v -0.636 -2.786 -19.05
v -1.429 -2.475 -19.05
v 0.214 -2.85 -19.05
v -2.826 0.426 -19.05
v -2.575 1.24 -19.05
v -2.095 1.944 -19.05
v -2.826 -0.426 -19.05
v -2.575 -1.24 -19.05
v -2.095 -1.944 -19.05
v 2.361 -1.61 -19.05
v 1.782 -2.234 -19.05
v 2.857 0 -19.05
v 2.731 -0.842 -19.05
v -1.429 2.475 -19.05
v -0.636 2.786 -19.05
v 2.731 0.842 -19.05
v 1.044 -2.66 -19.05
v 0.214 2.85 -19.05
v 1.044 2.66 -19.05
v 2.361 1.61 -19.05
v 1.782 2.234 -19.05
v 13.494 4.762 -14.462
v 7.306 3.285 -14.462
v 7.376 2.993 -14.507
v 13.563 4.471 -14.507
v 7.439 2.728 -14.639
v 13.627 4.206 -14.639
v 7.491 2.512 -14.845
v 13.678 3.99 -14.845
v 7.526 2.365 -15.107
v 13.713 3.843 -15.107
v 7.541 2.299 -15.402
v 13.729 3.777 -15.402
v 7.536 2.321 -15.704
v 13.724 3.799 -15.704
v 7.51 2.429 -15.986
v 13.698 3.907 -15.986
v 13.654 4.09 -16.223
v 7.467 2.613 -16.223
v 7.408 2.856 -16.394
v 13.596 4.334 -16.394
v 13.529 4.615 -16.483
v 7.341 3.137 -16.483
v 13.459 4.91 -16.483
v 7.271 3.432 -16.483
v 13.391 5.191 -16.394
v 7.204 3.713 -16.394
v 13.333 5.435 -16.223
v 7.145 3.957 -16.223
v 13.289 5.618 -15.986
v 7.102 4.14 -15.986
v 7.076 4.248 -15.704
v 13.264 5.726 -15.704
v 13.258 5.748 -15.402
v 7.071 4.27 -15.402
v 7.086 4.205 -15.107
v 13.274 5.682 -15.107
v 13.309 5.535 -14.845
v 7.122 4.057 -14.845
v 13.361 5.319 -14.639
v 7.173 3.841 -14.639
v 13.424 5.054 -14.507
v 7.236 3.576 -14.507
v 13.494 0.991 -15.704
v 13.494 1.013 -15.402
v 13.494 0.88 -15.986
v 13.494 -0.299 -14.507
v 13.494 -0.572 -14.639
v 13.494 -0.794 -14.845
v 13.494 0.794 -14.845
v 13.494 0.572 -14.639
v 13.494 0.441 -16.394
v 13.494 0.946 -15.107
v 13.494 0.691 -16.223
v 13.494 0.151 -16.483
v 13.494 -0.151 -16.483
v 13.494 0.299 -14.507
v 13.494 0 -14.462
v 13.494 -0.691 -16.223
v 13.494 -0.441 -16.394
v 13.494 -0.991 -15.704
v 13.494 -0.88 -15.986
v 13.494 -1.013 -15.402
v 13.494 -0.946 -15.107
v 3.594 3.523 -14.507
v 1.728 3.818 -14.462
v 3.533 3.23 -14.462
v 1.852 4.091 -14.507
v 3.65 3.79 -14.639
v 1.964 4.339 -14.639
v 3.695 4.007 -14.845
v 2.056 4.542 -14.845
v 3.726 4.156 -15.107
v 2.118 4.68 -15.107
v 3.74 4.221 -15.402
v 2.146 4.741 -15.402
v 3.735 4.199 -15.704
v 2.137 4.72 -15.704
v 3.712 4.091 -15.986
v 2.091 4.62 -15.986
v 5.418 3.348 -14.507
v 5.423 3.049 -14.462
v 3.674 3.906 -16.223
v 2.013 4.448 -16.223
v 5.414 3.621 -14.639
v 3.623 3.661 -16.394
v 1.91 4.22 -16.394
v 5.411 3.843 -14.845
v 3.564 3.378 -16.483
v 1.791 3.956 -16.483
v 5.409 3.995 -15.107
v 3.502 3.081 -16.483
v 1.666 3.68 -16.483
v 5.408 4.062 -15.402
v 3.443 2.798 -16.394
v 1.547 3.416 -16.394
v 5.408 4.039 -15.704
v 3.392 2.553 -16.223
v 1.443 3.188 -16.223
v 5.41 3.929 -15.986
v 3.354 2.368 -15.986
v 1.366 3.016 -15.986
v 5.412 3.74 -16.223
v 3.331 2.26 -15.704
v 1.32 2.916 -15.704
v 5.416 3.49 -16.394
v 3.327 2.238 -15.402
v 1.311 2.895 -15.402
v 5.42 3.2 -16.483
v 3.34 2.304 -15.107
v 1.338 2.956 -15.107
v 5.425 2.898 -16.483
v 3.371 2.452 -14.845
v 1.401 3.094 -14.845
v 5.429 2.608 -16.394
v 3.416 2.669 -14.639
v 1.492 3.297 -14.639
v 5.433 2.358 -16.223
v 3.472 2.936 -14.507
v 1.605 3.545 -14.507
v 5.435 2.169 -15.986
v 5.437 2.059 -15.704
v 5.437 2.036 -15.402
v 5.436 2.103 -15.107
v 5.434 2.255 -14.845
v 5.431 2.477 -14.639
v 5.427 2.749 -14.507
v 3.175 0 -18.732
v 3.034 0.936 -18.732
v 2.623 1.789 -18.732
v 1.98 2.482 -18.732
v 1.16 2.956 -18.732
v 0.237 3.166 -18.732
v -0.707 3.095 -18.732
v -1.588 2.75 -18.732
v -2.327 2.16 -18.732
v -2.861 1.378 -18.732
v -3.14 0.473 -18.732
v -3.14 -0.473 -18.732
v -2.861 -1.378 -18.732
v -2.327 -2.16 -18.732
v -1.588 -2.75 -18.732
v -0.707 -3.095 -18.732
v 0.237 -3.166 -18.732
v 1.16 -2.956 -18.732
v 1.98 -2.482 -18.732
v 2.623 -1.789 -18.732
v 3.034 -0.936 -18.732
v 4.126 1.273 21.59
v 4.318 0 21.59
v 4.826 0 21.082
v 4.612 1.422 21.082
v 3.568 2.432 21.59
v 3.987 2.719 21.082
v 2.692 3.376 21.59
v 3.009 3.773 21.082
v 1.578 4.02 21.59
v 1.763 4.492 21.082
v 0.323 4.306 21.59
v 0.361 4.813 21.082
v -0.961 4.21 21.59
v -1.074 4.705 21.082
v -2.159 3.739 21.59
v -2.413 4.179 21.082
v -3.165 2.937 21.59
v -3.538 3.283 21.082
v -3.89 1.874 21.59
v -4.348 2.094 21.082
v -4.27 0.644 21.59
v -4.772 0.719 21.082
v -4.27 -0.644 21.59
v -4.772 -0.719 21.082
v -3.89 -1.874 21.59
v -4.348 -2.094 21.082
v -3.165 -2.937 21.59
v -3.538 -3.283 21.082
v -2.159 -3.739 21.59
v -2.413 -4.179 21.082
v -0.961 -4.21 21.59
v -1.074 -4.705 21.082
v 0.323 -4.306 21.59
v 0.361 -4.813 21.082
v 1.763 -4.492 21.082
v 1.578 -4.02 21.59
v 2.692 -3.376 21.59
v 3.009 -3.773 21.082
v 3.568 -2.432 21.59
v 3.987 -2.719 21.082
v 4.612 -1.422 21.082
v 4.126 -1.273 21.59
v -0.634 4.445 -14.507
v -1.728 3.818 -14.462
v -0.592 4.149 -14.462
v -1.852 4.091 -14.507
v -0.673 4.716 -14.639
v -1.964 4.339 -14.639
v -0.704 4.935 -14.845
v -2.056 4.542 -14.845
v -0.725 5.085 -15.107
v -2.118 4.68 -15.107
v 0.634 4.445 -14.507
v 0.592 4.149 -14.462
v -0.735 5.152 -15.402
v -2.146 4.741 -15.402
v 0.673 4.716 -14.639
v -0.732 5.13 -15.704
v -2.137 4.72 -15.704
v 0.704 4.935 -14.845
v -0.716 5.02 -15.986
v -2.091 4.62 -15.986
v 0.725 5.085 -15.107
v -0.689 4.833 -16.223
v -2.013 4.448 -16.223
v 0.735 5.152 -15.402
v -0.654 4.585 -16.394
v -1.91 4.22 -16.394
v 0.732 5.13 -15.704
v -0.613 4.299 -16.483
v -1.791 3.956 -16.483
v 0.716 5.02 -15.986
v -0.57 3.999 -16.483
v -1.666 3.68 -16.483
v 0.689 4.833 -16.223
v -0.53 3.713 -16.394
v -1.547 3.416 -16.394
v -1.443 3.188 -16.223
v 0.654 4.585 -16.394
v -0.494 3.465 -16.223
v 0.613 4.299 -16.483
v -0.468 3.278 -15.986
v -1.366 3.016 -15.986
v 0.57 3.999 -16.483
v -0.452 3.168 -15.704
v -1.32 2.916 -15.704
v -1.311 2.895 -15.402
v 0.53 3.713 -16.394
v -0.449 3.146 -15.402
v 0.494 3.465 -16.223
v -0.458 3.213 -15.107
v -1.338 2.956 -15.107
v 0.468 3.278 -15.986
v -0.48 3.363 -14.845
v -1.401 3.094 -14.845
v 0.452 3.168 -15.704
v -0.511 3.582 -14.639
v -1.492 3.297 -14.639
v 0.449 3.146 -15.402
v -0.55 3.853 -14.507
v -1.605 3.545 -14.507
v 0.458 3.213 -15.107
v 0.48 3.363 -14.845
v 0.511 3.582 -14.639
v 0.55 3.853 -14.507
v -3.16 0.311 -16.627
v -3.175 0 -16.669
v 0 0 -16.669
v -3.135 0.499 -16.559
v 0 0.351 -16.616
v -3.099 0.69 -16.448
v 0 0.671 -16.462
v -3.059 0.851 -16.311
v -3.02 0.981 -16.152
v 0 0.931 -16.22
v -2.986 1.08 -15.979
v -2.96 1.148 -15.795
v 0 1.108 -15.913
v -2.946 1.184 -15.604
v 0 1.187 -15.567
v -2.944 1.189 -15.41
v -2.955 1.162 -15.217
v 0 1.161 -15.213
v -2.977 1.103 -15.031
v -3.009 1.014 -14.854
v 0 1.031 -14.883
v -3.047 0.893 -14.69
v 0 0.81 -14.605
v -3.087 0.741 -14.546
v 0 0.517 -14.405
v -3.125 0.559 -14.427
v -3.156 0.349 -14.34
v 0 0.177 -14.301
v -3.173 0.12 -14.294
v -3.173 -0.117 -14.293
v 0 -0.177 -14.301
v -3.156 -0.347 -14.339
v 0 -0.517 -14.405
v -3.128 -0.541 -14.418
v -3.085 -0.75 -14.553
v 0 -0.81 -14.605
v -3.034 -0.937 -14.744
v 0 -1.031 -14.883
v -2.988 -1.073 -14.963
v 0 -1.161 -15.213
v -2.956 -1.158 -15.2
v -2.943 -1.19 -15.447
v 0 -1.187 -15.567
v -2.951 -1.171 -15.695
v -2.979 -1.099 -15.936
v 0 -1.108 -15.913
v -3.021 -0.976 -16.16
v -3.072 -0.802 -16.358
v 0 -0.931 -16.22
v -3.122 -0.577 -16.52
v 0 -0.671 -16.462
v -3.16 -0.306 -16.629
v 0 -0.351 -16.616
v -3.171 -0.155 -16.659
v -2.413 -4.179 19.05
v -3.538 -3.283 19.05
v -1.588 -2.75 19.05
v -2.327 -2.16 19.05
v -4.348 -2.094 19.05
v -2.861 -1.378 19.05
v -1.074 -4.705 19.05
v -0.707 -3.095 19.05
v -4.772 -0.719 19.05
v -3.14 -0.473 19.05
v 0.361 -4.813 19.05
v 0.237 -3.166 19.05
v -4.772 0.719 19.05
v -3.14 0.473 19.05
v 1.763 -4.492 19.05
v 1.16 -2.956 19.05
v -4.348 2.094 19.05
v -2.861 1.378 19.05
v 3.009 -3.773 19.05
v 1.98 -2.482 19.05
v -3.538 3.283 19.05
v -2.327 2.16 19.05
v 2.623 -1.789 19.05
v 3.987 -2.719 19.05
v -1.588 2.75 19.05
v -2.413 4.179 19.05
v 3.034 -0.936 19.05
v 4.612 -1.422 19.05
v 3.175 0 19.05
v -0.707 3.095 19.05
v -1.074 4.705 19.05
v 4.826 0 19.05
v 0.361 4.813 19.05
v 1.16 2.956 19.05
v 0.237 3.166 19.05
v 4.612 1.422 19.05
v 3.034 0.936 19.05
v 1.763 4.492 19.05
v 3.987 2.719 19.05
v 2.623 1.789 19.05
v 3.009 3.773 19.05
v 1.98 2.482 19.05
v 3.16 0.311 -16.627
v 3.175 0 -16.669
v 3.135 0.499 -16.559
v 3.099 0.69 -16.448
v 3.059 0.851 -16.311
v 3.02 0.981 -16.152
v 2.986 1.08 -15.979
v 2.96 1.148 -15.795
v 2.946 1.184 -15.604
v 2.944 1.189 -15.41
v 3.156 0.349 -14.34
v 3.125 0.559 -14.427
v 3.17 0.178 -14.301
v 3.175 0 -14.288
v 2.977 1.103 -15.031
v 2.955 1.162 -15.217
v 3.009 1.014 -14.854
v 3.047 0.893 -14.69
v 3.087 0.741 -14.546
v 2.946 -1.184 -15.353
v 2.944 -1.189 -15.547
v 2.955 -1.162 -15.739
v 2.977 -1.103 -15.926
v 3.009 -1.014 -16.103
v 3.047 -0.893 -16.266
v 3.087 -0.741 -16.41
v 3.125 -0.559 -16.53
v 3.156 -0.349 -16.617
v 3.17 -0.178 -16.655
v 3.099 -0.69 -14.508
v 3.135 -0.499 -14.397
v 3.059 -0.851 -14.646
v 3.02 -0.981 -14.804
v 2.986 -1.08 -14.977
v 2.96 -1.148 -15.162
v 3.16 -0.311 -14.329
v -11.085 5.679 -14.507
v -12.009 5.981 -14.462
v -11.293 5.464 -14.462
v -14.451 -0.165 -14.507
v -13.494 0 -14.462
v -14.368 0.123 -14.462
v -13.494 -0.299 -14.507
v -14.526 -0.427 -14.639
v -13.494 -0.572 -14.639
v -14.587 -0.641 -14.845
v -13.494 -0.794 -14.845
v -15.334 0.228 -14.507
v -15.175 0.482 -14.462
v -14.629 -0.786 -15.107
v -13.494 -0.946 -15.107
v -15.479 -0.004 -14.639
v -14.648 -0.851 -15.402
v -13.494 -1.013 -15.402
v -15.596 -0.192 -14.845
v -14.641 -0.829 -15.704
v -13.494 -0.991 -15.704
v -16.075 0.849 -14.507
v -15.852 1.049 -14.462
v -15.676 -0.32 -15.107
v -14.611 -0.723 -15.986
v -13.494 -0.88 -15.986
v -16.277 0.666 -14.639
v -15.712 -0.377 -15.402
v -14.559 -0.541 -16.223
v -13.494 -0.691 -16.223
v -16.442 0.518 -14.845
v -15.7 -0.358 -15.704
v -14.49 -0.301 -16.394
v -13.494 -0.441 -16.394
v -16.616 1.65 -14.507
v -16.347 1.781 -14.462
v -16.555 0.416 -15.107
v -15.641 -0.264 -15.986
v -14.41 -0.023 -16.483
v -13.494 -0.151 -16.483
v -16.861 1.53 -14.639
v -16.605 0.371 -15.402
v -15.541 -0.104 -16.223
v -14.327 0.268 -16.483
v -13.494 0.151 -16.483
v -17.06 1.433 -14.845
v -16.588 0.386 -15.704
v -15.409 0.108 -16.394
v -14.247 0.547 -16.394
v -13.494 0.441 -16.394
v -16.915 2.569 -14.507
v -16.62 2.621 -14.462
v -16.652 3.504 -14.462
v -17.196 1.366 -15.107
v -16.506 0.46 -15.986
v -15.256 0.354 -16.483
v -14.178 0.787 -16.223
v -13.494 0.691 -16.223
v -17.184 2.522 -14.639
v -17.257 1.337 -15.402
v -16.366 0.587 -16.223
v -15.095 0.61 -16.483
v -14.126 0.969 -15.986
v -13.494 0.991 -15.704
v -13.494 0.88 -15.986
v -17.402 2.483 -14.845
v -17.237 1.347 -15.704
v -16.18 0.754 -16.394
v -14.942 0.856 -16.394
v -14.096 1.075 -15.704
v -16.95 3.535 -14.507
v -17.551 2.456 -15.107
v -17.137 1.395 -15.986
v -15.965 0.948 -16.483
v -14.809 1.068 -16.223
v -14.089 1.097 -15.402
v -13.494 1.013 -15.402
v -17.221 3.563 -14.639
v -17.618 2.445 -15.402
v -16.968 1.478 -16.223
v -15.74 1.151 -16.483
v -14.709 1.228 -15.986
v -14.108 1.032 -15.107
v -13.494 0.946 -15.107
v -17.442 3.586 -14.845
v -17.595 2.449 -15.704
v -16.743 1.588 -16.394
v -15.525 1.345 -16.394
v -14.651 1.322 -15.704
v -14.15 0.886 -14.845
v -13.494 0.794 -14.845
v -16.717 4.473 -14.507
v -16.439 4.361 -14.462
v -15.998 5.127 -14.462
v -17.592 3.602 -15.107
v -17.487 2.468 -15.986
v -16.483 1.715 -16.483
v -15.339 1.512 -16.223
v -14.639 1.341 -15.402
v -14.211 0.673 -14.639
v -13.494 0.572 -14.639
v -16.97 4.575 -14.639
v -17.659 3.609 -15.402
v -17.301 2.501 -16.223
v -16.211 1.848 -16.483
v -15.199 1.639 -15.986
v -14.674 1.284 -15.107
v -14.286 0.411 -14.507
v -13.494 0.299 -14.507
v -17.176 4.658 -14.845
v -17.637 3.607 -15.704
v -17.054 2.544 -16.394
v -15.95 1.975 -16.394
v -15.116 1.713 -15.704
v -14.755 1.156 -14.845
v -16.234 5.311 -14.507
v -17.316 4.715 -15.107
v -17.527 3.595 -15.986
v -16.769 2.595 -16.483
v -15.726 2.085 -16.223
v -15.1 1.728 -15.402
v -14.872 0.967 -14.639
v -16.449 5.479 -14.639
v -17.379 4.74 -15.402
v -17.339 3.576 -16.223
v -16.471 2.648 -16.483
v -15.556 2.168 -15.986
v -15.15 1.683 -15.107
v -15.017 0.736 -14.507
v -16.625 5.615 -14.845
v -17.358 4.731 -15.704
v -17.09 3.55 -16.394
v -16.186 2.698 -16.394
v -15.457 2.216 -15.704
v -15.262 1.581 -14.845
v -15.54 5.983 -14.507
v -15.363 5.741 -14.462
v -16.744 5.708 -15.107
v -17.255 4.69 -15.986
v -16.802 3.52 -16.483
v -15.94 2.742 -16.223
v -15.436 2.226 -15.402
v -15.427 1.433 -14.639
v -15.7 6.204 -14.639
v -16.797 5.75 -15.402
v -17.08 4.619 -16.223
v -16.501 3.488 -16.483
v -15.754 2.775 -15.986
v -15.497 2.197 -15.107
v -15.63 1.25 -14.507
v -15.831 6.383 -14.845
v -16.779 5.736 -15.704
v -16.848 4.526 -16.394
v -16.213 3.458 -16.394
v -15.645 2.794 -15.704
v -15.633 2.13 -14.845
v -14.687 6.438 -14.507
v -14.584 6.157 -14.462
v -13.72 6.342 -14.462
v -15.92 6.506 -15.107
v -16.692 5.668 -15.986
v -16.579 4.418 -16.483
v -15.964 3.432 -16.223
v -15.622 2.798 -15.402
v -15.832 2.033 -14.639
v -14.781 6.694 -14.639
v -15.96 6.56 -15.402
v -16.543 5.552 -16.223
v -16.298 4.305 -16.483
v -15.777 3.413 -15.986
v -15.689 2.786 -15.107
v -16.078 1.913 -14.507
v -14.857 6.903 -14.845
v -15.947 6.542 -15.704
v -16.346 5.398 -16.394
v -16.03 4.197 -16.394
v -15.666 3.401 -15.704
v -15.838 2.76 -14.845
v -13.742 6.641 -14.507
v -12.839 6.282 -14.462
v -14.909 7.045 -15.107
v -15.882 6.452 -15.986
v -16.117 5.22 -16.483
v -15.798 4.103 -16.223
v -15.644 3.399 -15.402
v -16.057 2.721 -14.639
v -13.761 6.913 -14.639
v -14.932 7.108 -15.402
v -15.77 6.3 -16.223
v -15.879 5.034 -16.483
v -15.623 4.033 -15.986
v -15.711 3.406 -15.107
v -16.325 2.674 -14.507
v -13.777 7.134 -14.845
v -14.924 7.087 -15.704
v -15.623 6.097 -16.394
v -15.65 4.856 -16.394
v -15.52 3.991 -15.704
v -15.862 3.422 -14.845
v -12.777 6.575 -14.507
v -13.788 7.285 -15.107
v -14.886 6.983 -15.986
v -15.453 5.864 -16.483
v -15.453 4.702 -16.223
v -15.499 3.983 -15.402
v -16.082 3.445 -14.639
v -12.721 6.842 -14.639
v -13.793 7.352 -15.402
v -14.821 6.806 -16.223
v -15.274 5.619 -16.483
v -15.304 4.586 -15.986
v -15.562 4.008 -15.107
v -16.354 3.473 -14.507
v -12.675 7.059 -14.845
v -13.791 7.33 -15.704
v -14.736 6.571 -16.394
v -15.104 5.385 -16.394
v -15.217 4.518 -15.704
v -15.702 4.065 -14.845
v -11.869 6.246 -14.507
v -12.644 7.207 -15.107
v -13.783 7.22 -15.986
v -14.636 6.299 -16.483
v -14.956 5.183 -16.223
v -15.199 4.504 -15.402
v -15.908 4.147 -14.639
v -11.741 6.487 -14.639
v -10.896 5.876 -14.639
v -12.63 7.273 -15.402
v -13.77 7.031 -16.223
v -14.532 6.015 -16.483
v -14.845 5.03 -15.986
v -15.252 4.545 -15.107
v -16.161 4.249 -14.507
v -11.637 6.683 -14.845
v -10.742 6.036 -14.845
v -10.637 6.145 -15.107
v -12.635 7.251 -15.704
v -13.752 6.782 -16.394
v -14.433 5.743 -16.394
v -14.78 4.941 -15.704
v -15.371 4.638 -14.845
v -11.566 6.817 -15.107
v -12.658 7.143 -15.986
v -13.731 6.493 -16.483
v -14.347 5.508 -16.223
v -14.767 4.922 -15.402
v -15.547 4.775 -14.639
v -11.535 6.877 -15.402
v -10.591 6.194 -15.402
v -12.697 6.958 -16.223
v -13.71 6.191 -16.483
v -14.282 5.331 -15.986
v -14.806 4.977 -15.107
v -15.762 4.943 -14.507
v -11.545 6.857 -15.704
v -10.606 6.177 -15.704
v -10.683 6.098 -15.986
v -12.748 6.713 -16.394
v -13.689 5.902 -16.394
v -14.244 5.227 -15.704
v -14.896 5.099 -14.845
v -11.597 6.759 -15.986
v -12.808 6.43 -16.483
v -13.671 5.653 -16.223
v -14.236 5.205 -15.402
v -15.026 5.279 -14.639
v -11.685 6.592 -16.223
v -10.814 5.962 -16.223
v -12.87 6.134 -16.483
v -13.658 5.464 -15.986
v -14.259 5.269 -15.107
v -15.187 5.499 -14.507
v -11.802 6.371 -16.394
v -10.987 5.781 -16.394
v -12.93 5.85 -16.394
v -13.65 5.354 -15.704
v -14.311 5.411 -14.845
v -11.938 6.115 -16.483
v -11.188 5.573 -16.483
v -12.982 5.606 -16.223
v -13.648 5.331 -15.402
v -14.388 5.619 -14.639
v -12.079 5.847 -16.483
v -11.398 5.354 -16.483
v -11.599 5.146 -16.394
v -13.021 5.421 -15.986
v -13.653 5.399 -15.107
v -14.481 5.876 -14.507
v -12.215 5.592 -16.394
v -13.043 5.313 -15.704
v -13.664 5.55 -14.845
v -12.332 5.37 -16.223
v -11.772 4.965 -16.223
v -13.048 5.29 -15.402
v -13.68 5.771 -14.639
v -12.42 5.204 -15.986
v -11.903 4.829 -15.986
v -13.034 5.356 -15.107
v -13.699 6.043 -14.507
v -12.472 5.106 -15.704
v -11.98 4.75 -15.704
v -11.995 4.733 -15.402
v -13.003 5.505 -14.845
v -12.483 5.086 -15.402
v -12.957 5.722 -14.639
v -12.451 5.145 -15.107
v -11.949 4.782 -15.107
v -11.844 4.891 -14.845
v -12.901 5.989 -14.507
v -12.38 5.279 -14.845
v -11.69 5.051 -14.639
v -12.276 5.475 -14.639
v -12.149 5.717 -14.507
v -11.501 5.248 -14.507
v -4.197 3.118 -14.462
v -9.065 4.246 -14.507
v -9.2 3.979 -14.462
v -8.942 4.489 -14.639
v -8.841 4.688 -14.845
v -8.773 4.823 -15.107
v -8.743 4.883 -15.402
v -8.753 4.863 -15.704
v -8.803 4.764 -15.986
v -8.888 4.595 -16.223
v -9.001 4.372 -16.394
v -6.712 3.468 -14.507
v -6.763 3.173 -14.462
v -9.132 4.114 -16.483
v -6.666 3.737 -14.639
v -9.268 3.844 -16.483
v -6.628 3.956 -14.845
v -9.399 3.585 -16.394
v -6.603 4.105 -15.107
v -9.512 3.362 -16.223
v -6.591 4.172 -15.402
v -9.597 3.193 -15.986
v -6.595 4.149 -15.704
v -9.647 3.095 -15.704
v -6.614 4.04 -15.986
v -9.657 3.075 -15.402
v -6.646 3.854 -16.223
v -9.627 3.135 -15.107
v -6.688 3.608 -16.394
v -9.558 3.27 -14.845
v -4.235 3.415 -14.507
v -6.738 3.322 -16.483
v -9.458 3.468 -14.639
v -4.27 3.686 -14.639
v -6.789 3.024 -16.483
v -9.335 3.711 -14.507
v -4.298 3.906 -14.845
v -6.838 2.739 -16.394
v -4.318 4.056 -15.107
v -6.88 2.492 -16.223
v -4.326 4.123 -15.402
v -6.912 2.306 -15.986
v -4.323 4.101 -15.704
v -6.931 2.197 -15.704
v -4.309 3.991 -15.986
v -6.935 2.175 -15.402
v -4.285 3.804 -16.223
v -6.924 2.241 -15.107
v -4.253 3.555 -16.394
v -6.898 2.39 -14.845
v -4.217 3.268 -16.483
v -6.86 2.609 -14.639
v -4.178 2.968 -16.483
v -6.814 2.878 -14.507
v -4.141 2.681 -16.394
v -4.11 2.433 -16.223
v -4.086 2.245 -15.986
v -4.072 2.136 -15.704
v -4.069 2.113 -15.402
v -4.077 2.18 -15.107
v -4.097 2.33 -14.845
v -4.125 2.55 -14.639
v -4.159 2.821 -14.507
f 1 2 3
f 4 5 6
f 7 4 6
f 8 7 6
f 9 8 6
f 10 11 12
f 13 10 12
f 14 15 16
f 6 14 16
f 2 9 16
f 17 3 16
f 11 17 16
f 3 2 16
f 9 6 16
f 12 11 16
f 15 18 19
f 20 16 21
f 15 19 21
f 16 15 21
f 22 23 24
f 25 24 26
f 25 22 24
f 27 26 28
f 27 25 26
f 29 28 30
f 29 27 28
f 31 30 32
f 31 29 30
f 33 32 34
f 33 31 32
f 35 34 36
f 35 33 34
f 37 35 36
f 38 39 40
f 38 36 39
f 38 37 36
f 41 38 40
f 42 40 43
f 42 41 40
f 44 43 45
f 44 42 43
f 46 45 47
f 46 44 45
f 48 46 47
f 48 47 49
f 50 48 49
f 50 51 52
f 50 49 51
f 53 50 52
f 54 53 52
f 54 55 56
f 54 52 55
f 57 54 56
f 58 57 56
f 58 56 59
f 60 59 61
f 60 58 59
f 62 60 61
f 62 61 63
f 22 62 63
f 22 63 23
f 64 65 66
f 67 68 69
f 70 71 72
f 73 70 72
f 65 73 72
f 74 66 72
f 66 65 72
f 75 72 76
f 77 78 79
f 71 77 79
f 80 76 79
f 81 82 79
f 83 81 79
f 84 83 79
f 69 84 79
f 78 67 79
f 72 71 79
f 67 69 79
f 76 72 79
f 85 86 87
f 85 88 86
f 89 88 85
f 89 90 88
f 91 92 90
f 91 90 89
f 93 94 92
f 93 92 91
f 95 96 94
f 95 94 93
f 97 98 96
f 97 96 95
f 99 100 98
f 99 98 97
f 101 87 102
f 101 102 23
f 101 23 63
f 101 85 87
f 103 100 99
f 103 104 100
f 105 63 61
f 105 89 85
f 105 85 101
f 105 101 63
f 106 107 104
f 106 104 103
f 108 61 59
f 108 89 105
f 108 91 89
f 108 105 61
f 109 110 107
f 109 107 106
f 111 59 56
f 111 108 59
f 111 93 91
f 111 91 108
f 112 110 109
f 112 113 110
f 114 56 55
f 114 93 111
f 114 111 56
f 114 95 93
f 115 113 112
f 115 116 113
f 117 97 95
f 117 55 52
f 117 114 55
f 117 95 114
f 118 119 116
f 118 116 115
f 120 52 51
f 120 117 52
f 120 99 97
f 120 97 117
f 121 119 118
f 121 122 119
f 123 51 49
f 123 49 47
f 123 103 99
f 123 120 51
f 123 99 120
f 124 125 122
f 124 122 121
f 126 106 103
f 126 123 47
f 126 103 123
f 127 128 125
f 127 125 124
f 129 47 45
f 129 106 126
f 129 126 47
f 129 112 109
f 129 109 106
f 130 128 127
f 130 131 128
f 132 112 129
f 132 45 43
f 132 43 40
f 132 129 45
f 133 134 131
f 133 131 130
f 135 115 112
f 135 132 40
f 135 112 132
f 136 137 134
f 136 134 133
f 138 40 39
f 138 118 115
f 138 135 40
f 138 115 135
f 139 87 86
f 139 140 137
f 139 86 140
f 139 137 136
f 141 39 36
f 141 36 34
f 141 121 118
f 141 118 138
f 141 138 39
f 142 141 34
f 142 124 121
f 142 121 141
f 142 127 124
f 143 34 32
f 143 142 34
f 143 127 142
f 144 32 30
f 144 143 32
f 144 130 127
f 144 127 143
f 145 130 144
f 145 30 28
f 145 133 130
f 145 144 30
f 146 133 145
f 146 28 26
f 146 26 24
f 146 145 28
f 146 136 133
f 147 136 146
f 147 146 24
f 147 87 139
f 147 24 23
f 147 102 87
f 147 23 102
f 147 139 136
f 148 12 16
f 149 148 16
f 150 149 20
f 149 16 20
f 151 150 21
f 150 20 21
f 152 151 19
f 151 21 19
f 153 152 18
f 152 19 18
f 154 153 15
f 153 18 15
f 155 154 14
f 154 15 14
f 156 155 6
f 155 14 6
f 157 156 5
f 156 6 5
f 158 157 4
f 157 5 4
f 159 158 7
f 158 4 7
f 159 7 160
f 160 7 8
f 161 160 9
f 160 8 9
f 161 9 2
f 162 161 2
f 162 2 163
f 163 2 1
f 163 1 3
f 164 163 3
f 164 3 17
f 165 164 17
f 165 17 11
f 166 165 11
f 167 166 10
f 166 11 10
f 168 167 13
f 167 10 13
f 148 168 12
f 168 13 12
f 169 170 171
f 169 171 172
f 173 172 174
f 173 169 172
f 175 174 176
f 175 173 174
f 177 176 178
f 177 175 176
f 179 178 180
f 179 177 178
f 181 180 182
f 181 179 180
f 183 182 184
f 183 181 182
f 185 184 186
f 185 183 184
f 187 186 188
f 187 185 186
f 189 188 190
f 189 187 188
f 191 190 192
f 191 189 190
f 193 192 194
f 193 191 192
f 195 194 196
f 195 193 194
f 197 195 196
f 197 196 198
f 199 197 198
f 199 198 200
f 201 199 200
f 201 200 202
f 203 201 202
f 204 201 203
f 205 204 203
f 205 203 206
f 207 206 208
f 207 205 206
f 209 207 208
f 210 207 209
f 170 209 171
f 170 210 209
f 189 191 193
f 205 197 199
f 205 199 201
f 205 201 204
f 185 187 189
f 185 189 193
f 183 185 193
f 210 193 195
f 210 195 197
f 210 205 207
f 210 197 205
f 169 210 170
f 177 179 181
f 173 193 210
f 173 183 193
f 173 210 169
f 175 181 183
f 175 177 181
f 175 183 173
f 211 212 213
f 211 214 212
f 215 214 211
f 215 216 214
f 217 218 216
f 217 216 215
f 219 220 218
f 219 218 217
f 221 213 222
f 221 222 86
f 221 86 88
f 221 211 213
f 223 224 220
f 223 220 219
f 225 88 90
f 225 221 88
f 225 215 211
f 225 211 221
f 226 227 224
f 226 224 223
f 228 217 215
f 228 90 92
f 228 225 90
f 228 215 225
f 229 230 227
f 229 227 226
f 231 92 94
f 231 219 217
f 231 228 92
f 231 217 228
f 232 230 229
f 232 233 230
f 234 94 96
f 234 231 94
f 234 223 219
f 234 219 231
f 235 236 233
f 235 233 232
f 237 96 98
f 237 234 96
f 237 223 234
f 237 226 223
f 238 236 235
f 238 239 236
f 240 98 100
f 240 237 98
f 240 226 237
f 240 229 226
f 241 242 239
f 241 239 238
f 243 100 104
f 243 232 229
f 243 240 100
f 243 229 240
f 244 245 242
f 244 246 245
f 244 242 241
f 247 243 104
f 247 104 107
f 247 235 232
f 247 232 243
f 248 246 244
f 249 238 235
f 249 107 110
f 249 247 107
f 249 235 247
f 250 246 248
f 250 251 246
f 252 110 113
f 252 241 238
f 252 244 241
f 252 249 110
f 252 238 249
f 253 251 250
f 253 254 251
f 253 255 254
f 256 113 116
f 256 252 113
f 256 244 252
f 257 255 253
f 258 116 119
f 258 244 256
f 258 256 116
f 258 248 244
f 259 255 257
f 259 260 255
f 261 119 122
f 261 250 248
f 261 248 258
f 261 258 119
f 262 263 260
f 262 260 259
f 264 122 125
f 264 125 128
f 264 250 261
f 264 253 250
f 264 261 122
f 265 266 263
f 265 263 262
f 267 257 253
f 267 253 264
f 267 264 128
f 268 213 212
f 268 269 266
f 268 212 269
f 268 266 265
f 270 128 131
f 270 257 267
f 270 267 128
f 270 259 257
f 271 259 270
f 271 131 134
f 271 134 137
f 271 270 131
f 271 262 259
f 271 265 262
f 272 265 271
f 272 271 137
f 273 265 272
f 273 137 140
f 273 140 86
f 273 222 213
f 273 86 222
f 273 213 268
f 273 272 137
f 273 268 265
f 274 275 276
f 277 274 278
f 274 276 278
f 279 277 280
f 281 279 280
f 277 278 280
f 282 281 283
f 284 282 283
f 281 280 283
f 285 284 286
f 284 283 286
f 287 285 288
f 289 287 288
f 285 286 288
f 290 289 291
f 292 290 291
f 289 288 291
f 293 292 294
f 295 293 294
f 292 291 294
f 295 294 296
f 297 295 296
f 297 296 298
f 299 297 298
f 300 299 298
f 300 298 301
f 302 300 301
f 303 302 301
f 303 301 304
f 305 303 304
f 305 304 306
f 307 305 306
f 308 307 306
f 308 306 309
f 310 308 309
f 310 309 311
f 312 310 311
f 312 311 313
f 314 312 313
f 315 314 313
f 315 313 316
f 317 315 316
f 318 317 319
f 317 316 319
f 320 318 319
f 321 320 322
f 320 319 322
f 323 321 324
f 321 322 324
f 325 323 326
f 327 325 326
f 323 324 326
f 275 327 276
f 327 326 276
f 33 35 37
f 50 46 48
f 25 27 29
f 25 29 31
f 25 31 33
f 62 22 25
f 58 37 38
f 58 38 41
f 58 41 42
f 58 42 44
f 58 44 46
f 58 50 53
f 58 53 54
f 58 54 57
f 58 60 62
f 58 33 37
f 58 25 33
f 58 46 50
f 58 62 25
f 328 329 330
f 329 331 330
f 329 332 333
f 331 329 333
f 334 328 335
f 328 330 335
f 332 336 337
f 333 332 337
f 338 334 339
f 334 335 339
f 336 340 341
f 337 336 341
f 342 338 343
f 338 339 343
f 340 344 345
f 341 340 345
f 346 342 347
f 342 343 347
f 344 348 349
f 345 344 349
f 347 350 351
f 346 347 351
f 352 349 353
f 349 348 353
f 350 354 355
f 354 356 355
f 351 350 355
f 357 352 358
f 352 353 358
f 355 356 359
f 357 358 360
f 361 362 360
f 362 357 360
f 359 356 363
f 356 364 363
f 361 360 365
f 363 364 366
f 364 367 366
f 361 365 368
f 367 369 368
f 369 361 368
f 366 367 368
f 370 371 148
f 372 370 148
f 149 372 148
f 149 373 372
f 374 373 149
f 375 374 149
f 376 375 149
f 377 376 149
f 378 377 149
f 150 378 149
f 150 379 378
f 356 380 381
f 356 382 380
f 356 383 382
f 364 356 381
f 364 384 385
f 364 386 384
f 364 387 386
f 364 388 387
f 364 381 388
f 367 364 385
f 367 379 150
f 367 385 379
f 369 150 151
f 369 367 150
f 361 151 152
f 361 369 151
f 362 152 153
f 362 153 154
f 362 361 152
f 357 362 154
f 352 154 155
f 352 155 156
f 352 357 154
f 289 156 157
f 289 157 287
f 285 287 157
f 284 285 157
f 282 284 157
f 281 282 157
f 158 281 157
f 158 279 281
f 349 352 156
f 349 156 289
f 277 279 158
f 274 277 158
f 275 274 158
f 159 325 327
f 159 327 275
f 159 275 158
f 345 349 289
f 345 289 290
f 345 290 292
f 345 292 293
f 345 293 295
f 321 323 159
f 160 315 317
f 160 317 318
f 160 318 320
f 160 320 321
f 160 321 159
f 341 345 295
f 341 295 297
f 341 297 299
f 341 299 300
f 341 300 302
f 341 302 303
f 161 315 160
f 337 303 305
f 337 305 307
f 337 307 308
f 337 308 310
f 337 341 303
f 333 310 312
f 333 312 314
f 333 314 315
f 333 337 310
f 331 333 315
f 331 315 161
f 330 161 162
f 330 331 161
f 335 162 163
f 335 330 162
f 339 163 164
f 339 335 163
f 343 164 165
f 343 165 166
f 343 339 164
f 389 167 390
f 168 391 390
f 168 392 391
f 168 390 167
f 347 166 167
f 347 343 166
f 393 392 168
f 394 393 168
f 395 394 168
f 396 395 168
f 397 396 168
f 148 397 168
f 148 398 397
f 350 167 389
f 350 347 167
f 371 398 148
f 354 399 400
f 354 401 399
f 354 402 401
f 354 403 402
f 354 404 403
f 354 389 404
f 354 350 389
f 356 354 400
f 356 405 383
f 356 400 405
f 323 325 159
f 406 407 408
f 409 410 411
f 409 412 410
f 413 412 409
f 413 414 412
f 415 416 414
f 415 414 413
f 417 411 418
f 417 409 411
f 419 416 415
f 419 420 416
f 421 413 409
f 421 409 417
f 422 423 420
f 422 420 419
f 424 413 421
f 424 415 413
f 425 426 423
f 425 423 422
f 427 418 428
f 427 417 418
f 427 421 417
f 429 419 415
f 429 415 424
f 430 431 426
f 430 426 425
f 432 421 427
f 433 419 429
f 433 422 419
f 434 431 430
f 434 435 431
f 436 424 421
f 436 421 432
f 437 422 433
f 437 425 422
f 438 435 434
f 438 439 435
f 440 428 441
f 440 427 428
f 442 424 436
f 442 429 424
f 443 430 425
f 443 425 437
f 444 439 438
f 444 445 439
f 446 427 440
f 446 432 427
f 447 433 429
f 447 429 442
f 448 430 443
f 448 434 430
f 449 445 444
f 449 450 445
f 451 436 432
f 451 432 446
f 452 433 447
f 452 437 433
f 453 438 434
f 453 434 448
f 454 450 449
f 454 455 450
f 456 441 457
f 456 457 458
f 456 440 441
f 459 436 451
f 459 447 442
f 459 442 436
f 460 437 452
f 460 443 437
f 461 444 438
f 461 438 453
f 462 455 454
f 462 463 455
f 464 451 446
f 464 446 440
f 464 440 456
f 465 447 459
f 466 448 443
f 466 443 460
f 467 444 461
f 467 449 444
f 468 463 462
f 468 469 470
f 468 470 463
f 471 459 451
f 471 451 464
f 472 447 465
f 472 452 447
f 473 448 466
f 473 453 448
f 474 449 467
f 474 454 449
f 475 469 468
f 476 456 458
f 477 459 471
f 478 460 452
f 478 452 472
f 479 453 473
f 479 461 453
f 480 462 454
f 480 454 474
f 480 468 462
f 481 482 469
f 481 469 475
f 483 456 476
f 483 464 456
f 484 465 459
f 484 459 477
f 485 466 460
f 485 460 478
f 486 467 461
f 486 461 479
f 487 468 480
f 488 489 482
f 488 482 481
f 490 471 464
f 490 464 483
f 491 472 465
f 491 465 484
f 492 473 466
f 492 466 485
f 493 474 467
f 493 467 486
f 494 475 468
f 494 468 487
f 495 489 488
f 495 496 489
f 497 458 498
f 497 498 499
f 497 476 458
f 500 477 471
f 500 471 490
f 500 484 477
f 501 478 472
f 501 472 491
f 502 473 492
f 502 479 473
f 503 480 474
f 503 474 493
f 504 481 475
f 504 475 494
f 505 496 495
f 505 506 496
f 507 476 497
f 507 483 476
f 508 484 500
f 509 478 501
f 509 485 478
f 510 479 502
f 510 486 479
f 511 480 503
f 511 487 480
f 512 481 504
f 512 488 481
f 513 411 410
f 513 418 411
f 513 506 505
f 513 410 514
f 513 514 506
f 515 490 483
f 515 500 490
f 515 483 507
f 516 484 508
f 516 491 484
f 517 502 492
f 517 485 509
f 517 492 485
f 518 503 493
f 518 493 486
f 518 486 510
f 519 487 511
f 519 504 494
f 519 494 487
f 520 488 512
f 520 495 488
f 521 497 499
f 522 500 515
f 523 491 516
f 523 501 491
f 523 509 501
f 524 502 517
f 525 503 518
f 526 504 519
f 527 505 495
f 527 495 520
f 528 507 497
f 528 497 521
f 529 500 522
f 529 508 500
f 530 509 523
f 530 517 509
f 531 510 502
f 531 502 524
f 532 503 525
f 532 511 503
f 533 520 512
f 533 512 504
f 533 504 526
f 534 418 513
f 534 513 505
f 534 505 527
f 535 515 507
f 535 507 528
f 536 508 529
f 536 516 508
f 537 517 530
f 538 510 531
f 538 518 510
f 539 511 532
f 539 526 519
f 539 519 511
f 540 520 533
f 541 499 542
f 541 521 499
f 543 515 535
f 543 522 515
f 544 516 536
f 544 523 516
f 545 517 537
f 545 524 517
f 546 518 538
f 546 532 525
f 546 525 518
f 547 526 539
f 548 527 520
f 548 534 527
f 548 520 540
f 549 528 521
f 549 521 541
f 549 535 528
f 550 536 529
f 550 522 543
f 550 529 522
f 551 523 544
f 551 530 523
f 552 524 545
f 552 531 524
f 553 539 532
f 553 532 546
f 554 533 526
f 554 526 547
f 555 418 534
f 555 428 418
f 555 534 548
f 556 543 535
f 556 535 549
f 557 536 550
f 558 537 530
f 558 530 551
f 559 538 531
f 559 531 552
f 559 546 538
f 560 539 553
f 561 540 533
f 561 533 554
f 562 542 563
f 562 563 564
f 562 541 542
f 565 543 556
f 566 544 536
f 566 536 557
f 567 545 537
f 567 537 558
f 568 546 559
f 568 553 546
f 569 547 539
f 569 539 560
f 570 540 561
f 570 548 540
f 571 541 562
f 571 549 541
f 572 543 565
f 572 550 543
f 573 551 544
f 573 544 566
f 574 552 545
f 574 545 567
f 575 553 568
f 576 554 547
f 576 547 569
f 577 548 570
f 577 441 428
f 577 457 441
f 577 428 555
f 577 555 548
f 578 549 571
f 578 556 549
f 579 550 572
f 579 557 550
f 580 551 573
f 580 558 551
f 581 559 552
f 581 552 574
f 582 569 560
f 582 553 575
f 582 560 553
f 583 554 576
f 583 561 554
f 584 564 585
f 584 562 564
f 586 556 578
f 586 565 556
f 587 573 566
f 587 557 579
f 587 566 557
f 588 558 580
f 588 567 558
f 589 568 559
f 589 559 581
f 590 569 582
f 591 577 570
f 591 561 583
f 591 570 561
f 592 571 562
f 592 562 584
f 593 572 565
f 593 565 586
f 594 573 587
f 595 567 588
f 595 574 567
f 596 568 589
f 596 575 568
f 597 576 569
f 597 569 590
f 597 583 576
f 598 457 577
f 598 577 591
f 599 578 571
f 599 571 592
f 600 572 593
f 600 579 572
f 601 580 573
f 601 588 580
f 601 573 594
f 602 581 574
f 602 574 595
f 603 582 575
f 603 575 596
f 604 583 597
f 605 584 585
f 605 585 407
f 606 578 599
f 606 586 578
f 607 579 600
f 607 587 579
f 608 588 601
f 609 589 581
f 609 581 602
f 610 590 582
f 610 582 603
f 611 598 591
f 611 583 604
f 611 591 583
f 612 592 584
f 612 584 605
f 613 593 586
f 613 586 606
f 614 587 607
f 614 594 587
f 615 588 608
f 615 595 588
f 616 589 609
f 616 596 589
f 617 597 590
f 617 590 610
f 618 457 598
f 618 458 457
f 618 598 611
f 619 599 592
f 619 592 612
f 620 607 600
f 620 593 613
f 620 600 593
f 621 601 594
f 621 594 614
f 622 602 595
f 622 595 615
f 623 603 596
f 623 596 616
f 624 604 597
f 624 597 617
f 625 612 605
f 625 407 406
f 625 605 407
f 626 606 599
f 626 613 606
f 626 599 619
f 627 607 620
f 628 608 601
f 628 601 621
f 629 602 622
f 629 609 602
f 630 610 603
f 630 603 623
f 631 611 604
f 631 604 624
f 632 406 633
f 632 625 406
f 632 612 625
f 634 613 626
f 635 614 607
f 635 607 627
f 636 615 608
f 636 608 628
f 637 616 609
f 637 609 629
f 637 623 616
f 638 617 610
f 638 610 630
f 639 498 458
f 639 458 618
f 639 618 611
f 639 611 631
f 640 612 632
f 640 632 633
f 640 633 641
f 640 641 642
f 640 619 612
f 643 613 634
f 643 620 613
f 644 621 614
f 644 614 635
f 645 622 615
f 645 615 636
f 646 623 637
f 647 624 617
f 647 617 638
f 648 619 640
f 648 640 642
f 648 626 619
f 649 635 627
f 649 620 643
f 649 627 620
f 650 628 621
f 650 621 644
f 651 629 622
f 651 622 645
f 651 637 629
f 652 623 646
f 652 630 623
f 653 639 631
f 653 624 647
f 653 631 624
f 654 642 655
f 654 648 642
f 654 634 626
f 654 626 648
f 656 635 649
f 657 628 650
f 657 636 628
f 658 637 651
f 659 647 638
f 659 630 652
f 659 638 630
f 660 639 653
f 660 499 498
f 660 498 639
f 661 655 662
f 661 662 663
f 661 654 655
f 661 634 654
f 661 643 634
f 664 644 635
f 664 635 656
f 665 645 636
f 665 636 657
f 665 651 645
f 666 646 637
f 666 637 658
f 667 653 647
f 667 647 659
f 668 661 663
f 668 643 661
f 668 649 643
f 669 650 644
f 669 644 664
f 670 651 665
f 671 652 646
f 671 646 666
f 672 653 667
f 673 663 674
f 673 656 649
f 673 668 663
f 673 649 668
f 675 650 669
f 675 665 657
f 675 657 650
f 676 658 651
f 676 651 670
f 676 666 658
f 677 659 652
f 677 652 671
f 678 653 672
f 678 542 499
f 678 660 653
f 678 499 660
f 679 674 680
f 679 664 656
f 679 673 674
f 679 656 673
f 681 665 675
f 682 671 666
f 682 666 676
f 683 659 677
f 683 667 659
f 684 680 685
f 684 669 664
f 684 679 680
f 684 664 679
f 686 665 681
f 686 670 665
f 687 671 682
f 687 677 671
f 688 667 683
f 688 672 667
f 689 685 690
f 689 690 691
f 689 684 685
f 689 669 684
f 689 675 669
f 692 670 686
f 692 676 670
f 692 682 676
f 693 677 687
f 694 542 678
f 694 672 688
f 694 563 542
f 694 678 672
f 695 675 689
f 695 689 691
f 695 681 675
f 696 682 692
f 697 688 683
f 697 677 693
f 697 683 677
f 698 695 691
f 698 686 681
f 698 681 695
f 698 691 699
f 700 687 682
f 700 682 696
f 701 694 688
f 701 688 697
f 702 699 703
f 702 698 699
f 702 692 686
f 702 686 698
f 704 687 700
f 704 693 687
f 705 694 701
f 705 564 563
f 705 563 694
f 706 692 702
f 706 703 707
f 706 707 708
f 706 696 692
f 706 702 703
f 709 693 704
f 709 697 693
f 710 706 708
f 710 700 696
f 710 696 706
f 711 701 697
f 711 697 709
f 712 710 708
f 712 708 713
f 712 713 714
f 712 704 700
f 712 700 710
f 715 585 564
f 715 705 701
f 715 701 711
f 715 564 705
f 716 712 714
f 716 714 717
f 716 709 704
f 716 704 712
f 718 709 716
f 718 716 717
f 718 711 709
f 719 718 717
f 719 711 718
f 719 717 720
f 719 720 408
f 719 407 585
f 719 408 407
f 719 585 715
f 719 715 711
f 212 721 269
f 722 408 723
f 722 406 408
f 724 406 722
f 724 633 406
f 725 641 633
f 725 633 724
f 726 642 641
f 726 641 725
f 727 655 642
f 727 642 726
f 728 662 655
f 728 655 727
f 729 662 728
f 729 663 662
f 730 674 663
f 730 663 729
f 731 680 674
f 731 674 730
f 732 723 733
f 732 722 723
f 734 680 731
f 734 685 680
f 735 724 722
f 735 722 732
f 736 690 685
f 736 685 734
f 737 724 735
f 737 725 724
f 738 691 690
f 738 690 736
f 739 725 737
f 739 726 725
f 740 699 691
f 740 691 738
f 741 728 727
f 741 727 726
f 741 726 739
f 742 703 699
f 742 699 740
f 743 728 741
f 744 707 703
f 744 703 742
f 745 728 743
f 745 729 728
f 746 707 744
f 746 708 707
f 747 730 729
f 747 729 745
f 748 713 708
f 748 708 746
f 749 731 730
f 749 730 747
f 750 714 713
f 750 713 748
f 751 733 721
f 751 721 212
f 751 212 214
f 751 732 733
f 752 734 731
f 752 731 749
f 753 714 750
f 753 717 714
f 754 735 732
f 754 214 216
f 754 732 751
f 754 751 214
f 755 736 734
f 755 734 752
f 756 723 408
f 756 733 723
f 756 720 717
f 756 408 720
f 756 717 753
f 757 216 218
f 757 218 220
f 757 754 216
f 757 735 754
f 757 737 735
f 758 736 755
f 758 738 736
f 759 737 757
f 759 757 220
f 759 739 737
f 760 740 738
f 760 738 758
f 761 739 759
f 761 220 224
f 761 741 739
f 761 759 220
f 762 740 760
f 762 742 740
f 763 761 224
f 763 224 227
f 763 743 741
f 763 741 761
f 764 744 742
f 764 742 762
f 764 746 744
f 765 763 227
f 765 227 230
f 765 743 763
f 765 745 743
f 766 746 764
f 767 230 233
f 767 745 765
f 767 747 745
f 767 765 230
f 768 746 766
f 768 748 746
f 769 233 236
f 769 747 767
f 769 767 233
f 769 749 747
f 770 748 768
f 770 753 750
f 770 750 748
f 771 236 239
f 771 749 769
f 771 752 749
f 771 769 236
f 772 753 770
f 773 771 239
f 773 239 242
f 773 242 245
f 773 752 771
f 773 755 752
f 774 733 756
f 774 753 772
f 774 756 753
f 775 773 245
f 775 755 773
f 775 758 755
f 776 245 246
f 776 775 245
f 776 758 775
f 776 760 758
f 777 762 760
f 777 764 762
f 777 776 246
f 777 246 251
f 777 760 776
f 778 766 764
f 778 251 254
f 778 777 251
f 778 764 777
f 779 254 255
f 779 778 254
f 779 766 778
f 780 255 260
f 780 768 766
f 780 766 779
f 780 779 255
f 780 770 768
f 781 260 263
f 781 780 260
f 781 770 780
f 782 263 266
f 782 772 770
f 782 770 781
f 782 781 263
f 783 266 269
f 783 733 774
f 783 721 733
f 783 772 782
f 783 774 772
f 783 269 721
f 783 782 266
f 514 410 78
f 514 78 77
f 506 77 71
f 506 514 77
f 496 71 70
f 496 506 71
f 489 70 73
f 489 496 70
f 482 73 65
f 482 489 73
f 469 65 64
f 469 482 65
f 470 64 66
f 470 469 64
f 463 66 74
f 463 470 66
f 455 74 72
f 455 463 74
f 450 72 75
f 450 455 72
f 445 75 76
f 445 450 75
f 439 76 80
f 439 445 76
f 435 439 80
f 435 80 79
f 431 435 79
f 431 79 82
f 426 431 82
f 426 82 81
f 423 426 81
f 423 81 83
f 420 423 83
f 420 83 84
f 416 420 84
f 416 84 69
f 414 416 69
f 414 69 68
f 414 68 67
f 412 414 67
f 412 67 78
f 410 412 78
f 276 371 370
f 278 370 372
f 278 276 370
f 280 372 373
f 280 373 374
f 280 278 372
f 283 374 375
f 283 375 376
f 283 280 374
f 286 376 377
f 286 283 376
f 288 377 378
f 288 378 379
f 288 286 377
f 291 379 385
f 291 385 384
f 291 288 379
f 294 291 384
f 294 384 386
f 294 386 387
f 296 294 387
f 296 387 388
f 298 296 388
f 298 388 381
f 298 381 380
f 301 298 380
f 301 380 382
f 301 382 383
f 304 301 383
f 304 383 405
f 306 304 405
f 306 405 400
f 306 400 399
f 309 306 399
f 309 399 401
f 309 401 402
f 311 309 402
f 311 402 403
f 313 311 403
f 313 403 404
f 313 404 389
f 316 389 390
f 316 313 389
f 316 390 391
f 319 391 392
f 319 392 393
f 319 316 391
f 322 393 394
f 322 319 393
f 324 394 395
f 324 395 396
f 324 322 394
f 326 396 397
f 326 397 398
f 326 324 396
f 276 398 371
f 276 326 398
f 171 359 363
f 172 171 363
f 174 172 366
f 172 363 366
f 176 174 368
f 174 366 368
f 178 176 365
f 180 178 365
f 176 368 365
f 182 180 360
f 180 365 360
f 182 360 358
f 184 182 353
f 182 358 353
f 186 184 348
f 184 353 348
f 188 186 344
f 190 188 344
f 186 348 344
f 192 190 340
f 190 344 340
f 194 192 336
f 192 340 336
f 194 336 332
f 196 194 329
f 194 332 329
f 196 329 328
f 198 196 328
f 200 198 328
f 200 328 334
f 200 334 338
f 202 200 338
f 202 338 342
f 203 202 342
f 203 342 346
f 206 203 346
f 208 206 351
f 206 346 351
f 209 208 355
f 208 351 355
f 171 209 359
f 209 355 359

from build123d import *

# Parameters (mm, degrees)
SKETCH1_R           = 3.175
EXTRUDE1_DEPTH      = 19.05
SKETCH2_R           = 4.826
EXTRUDE2_DEPTH      = 2.54
CHAMFER1_SIZE       = 0.508
SKETCH3_R           = 1.190625
EXTRUDE3_DEPTH      = 5.826
EXTRUDE3_DEPTH_BACK = 5.826
CHAMFER2_SIZE       = 0.3175
SKETCH7_R           = 1.016


with BuildPart() as part:
    # Sketch1 → Extrude1 (new body, symmetric)
    with BuildSketch(Plane.XY):
        Circle(SKETCH1_R)
    extrude(amount=EXTRUDE1_DEPTH, both=True)

    # Sketch2 → Extrude2 (add)
    with BuildSketch(Plane.XY.offset(19.05)):
        Circle(SKETCH2_R)
    extrude(amount=EXTRUDE2_DEPTH)

    # Chamfer1
    chamfer1_edges = [part.edges().sort_by_distance(p)[0] for p in [
        (-4.826, 0, 21.59),
    ]]
    chamfer(chamfer1_edges, length=CHAMFER1_SIZE)

    # Sketch3 → Extrude3 (cut, two sides)
    with BuildSketch(Plane(origin=(0, 0, 0), x_dir=(0, 0, -1), z_dir=(1, 0, 0))) as extrude3_sk:
        with Locations((15.478125, 0)):
            Circle(SKETCH3_R)
    extrude(amount=EXTRUDE3_DEPTH, mode=Mode.SUBTRACT)
    extrude(extrude3_sk.sketch, amount=-EXTRUDE3_DEPTH_BACK, mode=Mode.SUBTRACT)

    # Chamfer2
    chamfer2_edges = [part.edges().sort_by_distance(p)[0] for p in [
        (-3.175, 0, -19.05),
    ]]
    chamfer(chamfer2_edges, length=CHAMFER2_SIZE)


with BuildPart() as body_2:
    # Sweep1: sweep along a path in Sketch6
    with BuildLine(Plane.XY.offset(-15.478125)) as sweep1_path:
        Line((13.49375, 0), (-13.49375, 0))
        ThreePointArc((-13.49375, 0), (-16.438801729, 4.361294783), (-11.292994408, 5.463514764))
        ThreePointArc((-11.292994408, 5.463514764), (-6.763179694, 3.173261299), (-1.728419774, 3.817989796))
        ThreePointArc((-1.728419774, 3.817989796), (0, 4.191), (1.728419774, 3.817989796))
        ThreePointArc((1.728419774, 3.817989796), (4.472851559, 3.087280395), (7.306026778, 3.28466386))
        Line((7.306026778, 3.28466386), (13.49375, 4.7625))
    # Sketch7 → Sweep1 (sweep)
    with BuildSketch(Plane(origin=(13.49375, 0, -15.478125), x_dir=(0, 0, 1), z_dir=(-1, 0, 0))):
        Circle(SKETCH7_R)
    sweep(path=sweep1_path.line)


solid = Compound([part.part, body_2.part])
